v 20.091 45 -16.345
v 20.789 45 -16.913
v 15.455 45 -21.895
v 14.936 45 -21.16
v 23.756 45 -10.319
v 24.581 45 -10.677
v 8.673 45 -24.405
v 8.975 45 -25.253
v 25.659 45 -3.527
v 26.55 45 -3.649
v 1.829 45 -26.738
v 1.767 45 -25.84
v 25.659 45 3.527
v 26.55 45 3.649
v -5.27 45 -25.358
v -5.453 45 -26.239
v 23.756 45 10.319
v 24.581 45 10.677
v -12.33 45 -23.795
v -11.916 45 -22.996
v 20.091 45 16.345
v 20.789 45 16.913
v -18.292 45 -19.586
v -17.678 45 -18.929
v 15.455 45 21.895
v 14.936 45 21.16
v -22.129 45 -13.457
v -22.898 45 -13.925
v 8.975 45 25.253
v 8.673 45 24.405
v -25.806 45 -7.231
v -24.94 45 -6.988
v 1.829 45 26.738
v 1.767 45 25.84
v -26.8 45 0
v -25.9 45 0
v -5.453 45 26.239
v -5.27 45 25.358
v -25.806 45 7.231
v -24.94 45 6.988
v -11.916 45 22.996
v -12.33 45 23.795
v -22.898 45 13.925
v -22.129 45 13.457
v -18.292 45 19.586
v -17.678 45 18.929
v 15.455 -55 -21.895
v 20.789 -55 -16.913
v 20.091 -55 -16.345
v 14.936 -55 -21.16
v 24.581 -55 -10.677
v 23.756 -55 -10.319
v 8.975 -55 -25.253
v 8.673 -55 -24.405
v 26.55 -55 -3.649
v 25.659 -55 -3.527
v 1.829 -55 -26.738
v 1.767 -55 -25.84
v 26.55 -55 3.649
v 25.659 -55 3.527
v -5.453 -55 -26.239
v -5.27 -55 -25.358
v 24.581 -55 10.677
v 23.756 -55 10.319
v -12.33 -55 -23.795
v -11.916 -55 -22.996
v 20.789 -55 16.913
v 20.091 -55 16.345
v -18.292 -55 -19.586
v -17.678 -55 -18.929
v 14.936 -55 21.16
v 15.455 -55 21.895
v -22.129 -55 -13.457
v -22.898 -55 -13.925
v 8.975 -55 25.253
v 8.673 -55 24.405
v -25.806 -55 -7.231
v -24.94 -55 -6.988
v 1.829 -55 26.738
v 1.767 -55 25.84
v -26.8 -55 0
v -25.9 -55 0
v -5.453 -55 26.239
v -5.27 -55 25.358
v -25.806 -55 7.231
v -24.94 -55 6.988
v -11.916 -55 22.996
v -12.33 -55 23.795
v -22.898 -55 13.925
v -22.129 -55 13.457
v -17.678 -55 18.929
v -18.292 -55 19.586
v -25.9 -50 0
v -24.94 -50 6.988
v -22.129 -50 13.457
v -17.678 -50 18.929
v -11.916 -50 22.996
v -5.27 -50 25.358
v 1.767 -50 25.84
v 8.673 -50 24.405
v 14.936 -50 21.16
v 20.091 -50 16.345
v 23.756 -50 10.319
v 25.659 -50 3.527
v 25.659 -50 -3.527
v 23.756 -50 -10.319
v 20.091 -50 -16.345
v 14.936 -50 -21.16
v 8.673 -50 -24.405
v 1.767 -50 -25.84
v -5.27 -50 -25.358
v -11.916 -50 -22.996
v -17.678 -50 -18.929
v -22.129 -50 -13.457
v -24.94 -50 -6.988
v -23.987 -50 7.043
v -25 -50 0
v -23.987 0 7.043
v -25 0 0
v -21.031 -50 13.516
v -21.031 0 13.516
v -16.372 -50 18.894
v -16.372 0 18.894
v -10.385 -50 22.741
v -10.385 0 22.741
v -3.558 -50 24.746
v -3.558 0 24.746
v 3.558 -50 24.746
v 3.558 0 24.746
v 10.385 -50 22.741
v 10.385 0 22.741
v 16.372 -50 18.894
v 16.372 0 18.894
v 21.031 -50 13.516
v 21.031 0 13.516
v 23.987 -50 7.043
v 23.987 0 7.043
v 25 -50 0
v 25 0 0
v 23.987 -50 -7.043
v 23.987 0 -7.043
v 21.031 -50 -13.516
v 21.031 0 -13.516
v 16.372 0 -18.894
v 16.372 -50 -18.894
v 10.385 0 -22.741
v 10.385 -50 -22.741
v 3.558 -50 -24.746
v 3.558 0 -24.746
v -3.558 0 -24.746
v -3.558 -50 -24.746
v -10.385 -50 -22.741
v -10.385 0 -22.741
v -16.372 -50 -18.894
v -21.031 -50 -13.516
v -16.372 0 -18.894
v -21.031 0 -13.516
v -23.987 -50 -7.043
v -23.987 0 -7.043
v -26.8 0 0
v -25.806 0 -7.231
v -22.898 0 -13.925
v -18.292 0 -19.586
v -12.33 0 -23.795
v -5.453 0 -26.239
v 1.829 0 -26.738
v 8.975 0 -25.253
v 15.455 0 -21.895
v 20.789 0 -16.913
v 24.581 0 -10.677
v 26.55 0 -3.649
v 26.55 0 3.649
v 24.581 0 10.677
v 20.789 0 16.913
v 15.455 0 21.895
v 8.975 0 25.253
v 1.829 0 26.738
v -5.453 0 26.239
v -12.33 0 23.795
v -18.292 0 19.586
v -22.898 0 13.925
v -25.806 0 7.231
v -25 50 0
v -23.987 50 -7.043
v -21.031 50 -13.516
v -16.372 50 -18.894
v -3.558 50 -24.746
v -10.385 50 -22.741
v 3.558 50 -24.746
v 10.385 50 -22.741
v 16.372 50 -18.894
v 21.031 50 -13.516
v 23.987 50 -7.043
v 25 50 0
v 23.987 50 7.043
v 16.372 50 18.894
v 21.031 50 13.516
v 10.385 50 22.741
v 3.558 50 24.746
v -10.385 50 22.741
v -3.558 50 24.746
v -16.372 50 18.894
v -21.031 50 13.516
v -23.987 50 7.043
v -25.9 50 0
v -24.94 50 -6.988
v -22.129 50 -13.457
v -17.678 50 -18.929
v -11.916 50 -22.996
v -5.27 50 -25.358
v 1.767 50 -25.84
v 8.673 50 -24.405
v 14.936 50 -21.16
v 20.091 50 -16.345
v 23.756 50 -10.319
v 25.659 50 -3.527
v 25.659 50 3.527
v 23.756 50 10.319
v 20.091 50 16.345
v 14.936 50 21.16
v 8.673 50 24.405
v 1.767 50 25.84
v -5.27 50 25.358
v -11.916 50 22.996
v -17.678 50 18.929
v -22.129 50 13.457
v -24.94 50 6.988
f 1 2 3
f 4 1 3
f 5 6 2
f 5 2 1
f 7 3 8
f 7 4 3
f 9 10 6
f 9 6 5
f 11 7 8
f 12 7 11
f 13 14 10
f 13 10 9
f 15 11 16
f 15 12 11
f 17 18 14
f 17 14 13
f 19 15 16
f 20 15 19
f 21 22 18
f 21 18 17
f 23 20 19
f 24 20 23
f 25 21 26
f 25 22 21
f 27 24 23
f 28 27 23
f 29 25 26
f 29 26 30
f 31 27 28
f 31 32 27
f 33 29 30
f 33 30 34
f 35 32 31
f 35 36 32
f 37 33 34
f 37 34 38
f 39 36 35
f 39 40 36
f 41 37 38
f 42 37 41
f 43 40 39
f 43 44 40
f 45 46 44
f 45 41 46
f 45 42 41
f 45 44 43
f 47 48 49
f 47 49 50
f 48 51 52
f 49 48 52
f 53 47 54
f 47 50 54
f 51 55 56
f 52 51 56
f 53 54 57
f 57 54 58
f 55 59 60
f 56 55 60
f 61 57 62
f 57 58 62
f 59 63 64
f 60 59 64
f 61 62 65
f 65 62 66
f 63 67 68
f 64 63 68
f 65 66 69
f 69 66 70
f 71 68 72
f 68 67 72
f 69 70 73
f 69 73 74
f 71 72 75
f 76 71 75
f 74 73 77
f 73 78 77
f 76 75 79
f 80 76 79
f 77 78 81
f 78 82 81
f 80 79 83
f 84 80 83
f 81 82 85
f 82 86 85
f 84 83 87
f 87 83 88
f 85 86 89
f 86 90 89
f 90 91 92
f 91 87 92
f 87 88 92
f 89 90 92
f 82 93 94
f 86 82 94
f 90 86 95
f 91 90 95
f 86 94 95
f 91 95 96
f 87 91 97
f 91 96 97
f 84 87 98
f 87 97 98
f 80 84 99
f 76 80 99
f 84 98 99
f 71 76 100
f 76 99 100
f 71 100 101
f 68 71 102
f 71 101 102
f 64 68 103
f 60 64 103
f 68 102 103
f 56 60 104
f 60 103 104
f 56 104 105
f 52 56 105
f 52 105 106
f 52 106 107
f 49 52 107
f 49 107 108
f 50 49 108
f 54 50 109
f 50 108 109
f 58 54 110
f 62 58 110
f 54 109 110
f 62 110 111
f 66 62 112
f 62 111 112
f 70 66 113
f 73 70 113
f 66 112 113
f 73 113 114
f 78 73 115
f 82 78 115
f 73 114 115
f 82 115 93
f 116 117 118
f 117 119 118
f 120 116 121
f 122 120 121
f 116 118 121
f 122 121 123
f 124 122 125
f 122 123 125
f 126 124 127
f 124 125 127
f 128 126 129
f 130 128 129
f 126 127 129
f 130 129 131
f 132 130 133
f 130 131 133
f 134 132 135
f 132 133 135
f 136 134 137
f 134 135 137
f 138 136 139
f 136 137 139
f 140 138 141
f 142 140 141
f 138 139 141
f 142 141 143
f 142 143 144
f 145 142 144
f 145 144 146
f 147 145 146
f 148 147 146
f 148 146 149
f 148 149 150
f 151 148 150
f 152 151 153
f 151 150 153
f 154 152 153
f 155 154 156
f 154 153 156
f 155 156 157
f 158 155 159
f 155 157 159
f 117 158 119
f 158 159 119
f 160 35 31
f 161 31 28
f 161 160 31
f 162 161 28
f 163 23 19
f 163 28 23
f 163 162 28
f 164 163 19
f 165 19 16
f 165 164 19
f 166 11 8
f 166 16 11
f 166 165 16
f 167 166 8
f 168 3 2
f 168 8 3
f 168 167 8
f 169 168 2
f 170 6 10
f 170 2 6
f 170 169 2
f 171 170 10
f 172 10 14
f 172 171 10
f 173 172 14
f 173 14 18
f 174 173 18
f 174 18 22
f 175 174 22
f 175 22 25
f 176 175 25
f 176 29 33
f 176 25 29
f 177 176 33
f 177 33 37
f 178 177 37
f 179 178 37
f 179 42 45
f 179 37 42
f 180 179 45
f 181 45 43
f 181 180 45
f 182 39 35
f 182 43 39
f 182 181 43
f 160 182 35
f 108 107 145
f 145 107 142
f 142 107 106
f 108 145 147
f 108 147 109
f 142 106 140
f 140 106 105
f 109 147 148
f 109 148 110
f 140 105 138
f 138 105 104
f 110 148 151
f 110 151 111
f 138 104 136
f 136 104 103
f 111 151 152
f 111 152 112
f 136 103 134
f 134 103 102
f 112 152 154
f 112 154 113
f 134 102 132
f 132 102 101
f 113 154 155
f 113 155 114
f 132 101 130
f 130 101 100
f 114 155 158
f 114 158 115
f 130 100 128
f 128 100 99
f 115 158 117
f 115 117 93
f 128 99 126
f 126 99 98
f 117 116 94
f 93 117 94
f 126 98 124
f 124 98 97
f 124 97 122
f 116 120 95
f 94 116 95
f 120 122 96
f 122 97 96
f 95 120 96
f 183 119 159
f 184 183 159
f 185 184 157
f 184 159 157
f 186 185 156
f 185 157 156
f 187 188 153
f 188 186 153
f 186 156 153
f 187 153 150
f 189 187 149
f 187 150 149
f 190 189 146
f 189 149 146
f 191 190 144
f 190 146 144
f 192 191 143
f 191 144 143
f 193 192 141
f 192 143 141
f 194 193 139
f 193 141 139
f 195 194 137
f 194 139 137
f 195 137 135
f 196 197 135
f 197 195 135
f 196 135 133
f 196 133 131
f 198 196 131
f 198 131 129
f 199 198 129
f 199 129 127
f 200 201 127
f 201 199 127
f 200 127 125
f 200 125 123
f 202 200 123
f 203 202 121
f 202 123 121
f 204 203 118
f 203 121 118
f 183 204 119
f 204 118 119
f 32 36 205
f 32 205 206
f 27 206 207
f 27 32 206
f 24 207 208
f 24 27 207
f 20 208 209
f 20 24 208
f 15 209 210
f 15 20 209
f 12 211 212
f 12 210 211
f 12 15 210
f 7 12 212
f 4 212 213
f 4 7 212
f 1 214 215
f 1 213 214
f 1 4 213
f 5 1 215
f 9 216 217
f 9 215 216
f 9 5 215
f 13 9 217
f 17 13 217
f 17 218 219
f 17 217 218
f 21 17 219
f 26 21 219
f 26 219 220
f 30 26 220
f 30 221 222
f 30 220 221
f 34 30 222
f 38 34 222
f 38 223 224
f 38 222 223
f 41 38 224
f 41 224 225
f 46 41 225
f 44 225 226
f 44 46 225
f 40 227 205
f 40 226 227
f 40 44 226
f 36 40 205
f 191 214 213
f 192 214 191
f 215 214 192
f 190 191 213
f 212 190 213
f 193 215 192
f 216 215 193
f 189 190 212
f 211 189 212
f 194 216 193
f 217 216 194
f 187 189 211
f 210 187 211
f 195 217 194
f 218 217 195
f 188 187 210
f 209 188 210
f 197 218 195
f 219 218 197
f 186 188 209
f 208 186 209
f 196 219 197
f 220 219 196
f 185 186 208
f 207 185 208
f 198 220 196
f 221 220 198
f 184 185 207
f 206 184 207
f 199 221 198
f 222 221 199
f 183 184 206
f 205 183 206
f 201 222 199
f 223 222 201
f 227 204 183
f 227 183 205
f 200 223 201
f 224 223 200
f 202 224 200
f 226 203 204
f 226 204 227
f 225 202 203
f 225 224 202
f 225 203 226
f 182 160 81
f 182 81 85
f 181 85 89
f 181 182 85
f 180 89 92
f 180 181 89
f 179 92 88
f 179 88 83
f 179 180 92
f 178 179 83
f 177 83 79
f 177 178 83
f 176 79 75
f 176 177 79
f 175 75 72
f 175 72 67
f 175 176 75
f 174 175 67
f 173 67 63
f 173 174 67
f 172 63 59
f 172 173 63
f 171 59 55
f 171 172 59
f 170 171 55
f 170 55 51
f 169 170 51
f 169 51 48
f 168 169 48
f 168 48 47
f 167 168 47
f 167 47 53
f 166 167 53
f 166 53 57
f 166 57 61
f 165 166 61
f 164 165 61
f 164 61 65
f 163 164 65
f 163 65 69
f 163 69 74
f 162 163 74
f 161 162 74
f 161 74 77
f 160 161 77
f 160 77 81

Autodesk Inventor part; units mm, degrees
ref_plane "YZ Plane" through (0, 0, 0) normal (1, 0, 0) x (0, 1, 0)
ref_plane "XZ Plane" through (0, 0, 0) normal (0, 1, 0) x (-1, 0, 0)
ref_plane "XY Plane" through (0, 0, 0) normal (0, 0, 1) x (1, 0, 0)
sketch "Sketch1" plane through (0, 0, 0) normal (0, 1, 0) x (-1, 0, 0)
  circle A0 centre (0, 0) radius 25.9
  circle A1 centre (0, 0) radius 25
  circle A2 centre (0, 0) radius 26.8
  dimension "d0" = 51.8
  dimension "d1" = 50
  dimension "d2" = 53.6
extrude "Extrusion1" add sketch "Sketch1" along normal mid plane 100 contours A0
extrude "Extrusion2" add sketch "Sketch1" along normal blind 45 and the other way blind 55 contours A2
properties part number "extraTube" material "ABS Plastic"
